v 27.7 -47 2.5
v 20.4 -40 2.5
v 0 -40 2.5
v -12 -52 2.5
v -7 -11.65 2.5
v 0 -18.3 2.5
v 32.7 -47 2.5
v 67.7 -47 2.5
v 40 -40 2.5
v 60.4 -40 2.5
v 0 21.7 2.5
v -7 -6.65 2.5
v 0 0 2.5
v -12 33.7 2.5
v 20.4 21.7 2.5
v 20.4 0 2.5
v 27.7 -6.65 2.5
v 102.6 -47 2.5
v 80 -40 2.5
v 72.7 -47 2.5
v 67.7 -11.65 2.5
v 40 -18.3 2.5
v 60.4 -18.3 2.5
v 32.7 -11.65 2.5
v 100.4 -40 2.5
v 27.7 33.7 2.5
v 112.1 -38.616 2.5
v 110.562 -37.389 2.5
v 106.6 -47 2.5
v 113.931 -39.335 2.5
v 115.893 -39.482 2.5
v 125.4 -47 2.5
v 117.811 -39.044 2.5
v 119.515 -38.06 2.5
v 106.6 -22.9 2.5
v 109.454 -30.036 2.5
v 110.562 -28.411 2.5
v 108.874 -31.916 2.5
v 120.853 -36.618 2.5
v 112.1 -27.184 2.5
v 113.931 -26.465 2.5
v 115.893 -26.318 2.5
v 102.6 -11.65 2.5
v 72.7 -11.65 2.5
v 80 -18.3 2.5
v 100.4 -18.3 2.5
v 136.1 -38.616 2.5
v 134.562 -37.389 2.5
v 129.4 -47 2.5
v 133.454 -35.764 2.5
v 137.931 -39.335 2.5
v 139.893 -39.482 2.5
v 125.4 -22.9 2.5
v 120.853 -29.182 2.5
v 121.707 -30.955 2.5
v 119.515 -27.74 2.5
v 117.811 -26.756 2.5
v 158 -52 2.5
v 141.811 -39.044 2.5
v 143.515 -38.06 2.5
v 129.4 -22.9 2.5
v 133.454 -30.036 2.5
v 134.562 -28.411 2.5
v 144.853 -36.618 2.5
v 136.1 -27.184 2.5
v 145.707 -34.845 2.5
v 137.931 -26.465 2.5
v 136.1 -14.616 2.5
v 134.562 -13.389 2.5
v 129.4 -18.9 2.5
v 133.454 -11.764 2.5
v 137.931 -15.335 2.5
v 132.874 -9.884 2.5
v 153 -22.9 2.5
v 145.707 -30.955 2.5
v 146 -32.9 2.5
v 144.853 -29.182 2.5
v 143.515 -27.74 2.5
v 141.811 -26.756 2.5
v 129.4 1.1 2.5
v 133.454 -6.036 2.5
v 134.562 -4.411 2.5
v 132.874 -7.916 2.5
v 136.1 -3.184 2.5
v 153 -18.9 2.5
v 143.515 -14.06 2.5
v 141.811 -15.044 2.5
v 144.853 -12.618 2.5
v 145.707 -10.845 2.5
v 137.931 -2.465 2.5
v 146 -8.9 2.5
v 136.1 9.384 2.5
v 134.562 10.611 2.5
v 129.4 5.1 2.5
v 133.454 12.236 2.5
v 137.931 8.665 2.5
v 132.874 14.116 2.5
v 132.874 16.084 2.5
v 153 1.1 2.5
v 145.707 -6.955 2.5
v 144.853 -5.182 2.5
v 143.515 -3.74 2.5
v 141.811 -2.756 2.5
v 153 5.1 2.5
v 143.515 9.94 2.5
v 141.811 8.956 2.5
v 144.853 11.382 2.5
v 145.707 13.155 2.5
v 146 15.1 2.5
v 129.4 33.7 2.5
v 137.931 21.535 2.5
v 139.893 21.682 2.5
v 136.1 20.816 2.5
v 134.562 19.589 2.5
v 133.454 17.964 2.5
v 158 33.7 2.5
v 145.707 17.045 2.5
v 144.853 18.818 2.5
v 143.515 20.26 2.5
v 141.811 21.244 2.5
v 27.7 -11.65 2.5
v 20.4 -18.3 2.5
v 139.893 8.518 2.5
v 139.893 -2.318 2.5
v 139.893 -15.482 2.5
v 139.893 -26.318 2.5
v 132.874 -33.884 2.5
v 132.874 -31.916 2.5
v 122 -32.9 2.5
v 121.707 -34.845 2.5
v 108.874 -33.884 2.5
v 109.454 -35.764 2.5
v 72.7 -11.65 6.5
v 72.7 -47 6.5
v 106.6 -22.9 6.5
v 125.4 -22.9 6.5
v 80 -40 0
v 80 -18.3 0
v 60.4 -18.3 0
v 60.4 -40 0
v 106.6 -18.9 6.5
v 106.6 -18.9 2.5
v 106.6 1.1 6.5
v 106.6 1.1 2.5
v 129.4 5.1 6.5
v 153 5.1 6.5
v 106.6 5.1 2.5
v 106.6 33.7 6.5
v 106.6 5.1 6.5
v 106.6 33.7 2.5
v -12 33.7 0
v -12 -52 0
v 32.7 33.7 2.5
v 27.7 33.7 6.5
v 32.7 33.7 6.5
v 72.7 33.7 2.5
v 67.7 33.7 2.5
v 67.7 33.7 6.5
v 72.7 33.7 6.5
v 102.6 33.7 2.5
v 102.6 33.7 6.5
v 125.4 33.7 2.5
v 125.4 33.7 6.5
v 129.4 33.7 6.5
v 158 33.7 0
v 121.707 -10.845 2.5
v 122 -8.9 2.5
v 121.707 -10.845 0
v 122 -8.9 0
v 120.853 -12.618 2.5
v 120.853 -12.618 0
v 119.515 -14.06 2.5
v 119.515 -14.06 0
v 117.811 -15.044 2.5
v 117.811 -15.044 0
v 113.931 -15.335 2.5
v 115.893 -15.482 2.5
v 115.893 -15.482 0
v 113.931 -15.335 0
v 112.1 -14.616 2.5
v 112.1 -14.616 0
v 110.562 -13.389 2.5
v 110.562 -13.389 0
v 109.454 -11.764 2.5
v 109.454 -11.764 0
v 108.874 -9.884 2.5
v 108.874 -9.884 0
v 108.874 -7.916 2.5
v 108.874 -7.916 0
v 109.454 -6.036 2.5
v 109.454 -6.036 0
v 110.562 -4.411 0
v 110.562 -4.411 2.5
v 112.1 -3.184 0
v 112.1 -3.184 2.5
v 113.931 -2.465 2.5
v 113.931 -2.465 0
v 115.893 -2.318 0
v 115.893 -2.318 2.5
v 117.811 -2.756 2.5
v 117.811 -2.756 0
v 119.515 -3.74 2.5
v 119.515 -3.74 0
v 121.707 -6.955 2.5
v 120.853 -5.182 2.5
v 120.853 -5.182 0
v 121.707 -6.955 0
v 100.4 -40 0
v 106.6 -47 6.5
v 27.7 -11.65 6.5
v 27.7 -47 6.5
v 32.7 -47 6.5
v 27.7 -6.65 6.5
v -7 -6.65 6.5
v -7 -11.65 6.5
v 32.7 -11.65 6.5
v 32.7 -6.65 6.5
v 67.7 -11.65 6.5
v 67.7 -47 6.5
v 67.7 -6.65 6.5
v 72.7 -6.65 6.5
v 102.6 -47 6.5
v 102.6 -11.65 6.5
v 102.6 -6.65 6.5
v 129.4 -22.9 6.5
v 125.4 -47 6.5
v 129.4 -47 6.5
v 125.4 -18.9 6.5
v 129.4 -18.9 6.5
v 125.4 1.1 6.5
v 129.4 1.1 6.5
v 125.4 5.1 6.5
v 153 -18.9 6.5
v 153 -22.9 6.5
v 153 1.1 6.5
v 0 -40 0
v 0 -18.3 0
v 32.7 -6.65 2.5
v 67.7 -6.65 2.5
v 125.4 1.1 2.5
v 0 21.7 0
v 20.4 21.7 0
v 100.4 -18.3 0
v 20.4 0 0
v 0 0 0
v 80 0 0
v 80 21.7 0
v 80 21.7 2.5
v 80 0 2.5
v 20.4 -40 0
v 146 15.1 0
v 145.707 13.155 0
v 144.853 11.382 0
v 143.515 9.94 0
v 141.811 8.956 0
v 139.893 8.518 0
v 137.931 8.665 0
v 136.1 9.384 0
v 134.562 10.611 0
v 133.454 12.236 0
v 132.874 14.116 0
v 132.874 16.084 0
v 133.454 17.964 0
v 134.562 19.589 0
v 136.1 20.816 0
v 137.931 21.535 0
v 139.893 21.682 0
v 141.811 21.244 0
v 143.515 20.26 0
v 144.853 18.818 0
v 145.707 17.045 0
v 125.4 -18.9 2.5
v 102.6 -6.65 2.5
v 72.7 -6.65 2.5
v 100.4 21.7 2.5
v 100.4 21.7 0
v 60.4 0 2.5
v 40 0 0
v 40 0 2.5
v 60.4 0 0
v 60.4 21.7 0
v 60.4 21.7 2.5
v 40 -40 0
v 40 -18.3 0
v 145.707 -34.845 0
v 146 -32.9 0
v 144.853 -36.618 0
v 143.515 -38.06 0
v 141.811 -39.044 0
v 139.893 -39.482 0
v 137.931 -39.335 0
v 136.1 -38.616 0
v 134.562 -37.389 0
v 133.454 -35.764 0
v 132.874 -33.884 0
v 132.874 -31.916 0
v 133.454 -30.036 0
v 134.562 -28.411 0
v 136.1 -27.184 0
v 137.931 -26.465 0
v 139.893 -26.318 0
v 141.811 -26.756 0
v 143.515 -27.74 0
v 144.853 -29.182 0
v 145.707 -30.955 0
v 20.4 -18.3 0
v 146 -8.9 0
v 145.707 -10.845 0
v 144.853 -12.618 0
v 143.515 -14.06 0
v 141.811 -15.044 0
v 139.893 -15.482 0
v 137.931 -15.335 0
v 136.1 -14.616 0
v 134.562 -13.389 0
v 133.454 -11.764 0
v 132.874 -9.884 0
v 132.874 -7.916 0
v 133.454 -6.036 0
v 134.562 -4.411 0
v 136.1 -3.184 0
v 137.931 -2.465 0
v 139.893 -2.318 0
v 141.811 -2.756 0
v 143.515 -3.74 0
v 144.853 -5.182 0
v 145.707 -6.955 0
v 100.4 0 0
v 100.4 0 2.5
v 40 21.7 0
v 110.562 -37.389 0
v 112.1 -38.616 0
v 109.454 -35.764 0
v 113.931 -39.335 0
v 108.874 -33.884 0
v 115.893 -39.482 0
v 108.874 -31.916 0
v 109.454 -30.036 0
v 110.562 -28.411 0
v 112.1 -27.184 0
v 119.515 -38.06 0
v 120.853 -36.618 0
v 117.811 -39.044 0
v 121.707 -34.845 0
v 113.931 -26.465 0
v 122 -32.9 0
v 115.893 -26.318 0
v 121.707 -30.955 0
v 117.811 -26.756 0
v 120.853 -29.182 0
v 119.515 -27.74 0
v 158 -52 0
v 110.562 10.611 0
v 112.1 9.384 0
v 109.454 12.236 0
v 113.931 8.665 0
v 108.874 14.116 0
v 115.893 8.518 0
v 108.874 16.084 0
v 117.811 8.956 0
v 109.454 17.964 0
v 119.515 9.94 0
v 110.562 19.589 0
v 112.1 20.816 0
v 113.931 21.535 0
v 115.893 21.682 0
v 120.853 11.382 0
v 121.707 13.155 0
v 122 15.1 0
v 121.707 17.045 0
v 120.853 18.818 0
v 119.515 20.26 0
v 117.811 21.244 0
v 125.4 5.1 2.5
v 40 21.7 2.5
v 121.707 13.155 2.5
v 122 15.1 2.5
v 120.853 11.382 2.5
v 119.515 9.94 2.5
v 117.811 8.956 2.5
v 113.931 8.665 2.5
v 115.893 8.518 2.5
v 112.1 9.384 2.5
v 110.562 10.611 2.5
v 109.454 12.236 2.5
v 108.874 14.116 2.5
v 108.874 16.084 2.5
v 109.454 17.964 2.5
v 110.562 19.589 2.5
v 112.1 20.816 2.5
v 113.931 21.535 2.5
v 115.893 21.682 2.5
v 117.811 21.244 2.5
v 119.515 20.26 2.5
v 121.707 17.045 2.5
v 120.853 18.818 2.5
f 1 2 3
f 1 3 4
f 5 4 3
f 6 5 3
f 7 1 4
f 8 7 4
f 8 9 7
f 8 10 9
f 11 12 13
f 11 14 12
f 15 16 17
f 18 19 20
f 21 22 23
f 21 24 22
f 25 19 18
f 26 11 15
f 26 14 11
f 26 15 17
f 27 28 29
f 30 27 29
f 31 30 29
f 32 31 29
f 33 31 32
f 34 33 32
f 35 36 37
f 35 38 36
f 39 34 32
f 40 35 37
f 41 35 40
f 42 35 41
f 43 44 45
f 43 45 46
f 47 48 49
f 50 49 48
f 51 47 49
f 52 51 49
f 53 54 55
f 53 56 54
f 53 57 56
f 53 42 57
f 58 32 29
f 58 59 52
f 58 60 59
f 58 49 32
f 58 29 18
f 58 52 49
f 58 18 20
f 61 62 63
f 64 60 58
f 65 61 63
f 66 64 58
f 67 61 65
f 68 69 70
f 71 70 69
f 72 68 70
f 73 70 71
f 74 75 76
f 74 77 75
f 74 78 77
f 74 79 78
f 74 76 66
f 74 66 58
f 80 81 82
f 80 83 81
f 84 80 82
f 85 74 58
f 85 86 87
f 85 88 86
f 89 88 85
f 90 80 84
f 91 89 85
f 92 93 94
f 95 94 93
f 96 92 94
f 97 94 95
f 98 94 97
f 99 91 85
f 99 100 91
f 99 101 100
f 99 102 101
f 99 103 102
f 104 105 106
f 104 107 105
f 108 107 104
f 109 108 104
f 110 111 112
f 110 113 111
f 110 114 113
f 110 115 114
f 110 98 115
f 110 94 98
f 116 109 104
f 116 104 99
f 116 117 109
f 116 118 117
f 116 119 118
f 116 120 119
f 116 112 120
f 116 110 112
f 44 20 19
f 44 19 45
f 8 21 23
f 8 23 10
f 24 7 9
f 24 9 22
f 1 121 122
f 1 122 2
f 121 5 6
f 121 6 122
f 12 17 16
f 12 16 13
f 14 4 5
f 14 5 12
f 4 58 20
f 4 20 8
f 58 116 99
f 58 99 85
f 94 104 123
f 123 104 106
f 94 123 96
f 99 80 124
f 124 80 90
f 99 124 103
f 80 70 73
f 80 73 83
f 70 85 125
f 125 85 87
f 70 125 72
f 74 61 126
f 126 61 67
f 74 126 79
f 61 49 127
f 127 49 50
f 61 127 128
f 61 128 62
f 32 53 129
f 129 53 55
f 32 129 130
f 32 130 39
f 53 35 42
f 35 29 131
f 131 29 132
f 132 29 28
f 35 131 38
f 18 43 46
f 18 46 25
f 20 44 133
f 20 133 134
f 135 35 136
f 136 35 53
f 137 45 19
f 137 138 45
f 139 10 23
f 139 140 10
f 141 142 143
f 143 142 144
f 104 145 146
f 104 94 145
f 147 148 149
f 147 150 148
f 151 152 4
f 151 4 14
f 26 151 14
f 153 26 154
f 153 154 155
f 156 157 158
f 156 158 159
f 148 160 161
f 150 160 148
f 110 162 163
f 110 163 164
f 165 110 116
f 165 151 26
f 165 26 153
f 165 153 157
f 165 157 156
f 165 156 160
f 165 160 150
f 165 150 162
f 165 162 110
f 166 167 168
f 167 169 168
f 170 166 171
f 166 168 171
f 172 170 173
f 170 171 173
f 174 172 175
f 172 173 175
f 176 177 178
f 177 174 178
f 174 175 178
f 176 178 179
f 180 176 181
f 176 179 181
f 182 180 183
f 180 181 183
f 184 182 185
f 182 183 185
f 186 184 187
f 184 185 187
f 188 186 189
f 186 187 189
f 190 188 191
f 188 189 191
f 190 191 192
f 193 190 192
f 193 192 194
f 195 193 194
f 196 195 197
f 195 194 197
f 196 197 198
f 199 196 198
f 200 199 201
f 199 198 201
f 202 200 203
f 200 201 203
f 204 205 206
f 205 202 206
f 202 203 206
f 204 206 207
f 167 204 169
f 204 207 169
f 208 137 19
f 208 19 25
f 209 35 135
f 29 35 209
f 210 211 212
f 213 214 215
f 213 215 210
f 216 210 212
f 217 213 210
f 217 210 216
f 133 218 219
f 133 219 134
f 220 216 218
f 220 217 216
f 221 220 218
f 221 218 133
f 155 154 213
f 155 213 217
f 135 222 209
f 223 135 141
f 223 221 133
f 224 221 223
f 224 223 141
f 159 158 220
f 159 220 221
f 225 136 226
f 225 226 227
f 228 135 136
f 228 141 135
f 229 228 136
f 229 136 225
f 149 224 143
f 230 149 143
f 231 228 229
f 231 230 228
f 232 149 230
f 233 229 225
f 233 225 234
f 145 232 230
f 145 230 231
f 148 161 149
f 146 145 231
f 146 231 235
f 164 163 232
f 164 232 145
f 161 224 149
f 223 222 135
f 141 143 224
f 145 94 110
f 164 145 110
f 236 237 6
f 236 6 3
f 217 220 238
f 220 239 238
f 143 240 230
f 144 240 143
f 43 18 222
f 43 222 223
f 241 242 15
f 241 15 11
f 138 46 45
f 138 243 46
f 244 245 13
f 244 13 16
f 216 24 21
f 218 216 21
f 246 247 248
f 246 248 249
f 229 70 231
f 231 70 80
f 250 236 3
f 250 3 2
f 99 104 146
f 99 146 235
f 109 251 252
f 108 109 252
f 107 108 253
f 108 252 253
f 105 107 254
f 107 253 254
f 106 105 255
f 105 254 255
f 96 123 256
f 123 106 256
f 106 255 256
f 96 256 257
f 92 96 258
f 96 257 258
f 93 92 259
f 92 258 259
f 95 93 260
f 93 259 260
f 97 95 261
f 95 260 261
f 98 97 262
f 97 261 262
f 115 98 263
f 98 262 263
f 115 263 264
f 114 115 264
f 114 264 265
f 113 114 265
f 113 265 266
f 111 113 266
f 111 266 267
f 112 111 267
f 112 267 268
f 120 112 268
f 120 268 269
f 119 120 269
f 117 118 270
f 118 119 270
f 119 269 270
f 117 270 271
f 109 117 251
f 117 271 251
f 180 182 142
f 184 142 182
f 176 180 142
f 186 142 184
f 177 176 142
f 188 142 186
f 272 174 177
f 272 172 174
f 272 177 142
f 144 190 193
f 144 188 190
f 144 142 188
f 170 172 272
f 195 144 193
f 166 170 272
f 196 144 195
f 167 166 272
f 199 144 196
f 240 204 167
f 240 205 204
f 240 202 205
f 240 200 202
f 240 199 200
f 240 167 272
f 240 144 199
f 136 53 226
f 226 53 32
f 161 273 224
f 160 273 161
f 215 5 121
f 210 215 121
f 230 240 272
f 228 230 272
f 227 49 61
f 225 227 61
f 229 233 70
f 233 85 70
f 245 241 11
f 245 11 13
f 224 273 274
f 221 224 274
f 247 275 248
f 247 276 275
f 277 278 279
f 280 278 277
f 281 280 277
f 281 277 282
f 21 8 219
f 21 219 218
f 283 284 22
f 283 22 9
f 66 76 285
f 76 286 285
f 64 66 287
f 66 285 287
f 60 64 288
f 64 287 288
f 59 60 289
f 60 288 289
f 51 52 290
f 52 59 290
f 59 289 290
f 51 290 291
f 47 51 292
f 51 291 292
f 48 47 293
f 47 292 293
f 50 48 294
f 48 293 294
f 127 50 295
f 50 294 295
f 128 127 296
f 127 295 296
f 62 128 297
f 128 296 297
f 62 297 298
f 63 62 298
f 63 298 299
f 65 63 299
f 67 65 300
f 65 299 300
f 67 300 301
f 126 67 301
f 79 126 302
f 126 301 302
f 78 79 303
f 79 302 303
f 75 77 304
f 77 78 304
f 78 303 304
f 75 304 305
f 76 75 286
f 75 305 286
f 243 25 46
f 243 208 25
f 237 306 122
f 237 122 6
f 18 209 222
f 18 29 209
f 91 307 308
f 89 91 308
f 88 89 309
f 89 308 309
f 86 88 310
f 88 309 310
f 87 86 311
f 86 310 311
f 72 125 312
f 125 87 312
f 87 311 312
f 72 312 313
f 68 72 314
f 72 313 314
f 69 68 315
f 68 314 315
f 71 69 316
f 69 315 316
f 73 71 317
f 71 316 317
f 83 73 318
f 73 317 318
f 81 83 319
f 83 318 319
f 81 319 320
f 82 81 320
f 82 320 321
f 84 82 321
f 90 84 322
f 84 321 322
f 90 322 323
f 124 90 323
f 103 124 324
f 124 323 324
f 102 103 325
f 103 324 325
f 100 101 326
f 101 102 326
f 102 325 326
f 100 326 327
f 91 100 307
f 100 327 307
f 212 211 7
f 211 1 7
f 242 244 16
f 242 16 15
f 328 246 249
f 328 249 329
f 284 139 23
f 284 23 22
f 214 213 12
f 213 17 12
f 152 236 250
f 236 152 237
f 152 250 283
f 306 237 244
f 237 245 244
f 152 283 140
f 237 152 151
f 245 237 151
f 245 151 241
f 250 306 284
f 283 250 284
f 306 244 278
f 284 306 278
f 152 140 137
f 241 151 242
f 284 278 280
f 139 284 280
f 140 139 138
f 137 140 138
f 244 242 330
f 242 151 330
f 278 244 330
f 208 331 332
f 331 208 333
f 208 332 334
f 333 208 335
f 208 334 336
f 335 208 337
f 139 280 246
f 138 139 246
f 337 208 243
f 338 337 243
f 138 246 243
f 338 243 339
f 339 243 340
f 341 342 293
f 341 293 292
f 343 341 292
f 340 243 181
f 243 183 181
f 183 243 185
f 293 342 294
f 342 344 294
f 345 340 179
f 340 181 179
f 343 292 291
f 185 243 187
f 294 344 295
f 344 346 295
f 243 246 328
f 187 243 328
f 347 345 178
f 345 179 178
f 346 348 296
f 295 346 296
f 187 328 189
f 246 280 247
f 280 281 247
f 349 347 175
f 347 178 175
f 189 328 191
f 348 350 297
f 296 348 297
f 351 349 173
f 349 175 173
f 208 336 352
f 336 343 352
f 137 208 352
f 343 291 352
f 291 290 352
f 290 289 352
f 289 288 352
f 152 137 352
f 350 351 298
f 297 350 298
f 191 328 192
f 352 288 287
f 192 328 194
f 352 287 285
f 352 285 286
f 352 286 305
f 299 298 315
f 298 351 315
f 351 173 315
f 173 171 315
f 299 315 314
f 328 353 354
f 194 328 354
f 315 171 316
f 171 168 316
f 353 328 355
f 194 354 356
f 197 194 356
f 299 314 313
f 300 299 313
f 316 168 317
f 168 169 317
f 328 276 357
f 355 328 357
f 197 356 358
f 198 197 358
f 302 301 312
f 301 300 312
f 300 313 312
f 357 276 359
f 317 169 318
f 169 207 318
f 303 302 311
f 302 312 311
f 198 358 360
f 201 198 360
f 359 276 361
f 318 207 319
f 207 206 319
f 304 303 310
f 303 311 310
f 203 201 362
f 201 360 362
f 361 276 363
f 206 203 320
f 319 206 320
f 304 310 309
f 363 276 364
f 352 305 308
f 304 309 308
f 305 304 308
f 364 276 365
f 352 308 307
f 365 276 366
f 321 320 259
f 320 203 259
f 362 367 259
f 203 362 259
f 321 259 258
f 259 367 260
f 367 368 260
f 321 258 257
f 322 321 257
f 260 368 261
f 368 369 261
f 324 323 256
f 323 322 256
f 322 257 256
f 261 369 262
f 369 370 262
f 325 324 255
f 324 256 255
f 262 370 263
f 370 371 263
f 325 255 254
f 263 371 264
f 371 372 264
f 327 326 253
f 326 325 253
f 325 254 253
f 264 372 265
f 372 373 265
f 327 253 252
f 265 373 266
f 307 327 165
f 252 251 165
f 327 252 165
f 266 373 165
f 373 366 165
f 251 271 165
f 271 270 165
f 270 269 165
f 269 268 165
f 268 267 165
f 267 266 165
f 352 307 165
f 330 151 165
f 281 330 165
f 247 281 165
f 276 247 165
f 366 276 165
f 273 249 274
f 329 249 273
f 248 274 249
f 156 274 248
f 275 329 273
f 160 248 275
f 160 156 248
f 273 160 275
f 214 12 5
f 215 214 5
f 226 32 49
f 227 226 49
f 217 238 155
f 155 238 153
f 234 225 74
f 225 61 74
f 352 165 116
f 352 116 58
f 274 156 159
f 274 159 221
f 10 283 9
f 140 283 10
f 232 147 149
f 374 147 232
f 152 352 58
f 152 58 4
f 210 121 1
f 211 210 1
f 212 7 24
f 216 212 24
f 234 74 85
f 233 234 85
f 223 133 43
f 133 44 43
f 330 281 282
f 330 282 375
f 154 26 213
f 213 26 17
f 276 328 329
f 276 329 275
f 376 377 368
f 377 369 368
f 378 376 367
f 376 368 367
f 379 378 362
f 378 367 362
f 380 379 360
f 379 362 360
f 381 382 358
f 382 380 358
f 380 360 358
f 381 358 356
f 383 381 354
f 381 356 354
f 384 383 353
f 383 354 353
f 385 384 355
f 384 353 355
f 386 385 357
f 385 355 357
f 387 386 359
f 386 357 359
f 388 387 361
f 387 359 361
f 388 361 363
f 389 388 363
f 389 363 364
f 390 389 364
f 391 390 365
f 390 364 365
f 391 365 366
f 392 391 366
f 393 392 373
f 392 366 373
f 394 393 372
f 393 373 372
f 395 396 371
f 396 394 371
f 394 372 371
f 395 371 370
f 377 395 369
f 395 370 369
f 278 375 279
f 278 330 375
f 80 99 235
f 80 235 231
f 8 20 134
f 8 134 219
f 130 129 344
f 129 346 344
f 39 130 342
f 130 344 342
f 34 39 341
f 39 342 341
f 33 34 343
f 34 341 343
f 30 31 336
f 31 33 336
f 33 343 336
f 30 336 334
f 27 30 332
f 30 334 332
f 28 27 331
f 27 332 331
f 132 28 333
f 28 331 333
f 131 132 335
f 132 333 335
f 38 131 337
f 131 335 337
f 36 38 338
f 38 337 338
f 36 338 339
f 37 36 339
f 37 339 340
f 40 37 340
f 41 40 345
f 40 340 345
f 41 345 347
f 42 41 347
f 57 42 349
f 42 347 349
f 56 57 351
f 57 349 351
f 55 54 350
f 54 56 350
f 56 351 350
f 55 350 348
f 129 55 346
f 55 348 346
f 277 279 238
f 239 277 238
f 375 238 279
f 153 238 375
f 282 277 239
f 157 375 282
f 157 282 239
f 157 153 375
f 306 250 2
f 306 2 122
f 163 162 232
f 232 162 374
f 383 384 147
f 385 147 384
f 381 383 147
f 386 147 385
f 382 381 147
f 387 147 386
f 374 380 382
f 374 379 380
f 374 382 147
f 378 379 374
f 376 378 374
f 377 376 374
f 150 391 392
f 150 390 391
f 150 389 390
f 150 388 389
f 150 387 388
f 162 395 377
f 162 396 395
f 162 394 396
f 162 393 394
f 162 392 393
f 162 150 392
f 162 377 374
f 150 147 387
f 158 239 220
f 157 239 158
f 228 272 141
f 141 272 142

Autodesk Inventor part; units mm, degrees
ref_plane "YZ Plane" through (0, 0, 0) normal (1, 0, 0) x (0, 1, 0)
ref_plane "XZ Plane" through (0, 0, 0) normal (0, 1, 0) x (-1, 0, 0)
ref_plane "XY Plane" through (0, 0, 0) normal (0, 0, 1) x (1, 0, 0)
sketch "Sketch1" plane through (0, 0, 0) normal (0, 0, 1) x (1, 0, 0)
  point P0 (0, 0)
sketch "Sketch2" plane through (0, 0, 0) normal (0, 0, 1) x (1, 0, 0)
  line L0 (0, 0) -> (20.4, 0)
  line L1 (20.4, 0) -> (20.4, 21.7)
  line L2 (20.4, 21.7) -> (0, 21.7)
  line L3 (0, 21.7) -> (0, 0)
  line L4 (40, 0) -> (60.4, 0)
  line L5 (60.4, 0) -> (60.4, 21.7)
  line L6 (60.4, 21.7) -> (40, 21.7)
  line L7 (40, 21.7) -> (40, 0)
  line L8 (80, 0) -> (100.4, 0)
  line L9 (100.4, 0) -> (100.4, 21.7)
  line L10 (100.4, 21.7) -> (80, 21.7)
  line L11 (80, 21.7) -> (80, 0)
  line L12 (0, -40) -> (20.4, -40)
  line L13 (20.4, -40) -> (20.4, -18.3)
  line L14 (20.4, -18.3) -> (0, -18.3)
  line L15 (0, -18.3) -> (0, -40)
  line L16 (40, -40) -> (60.4, -40)
  line L17 (60.4, -40) -> (60.4, -18.3)
  line L18 (60.4, -18.3) -> (40, -18.3)
  line L19 (40, -18.3) -> (40, -40)
  line L20 (80, -40) -> (100.4, -40)
  line L21 (100.4, -40) -> (100.4, -18.3)
  line L22 (100.4, -18.3) -> (80, -18.3)
  line L23 (80, -18.3) -> (80, -40)
  line L24 (100.4, 21.7) -> (175.4, 21.7) construction
  line L25 (175.4, 21.7) -> (175.4, -53.3) construction
  line L26 (175.4, -53.3) -> (100.4, -53.3) construction
  line L27 (100.4, -53.3) -> (100.4, 21.7) construction
  circle A0 centre (115.4, 15.1) radius 6.6 construction
  line L28 (115.4, 15.1) -> (115.4, -53.3) construction
  circle A1 centre (115.4, -8.9) radius 6.6 construction
  circle A2 centre (115.4, -32.9) radius 6.6 construction
  line L29 (100.4, 15.1) -> (200.3961, 15.1) construction
  circle A3 centre (139.4, 15.1) radius 6.6 construction
  circle A4 centre (139.4, -8.9) radius 6.6 construction
  circle A5 centre (139.4, -32.9) radius 6.6 construction
  circle A6 centre (115.4, 15.1) radius 6.6
  circle A7 centre (139.4, 15.1) radius 6.6 construction
  circle A8 centre (139.4, 15.1) radius 6.6
  circle A9 centre (115.4, -8.9) radius 6.6 construction
  circle A10 centre (115.4, -8.9) radius 6.6
  circle A11 centre (139.4, -8.9) radius 6.6 construction
  circle A12 centre (139.4, -8.9) radius 6.6
  circle A13 centre (115.4, -32.9) radius 6.6 construction
  circle A14 centre (115.4, -32.9) radius 6.6
  circle A15 centre (139.4, -32.9) radius 6.6 construction
  circle A16 centre (139.4, -32.9) radius 6.6
  line L30 (0, 21.7) -> (-12, 21.7) construction
  line L31 (-12, 21.7) -> (-12, 33.7) construction
  line L32 (-12, 33.7) -> (0, 33.7) construction
  line L33 (0, 33.7) -> (0, 21.7) construction
  line L34 (146, -40) -> (158, -40) construction
  line L35 (158, -40) -> (158, -52) construction
  line L36 (158, -52) -> (146, -52) construction
  line L37 (146, -52) -> (146, -40) construction
  line L38 (139.4, -32.9) -> (139.4, -74.4589) construction
  line L39 (-12, 33.7) -> (158, 33.7)
  line L40 (158, 33.7) -> (158, -52)
  line L41 (158, -52) -> (-12, -52)
  line L42 (-12, -52) -> (-12, 33.7)
  point P0 (146, -46)
  dimension "d0" = 20.4
  dimension "d1" = 21.7
  dimension "d5" = 40
  dimension "d8" = 40
  dimension "d11" = 75
  dimension "d12" = 75
  dimension "d13" = 13.2
  dimension "d14" = 15
  dimension "d15" = 13.2
  dimension "d16" = 24
  dimension "d17" = 13.2
  dimension "d18" = 24
  dimension "d19" = 61.7
  dimension "d20" = 13.2
  dimension "d21" = 24
  dimension "d22" = 13.2
  dimension "d23" = 13.2
  dimension "d26" = 24
  dimension "d29" = 24
  dimension "d32" = 12
  dimension "d33" = 12
  dimension "d34" = 12
  dimension "d35" = 12
  dimension "d36" = 6.6
extrude "Extrusion1" add sketch "Sketch2" along normal blind 2.5
sketch "Sketch3" plane through (0, 0, 2.5) normal (0, 0, 1) x (1, 0, 0)
  line L0 (-12, -52) -> (158, -52) construction
  line L1 (158, -52) -> (158, 33.7) construction
  line L2 (158, 33.7) -> (-12, 33.7) construction
  line L3 (-12, 33.7) -> (-12, -52) construction
  circle A0 centre (115.4, 15.1) radius 6.6 construction
  circle A1 centre (139.4, 15.1) radius 6.6 construction
  circle A2 centre (115.4, -8.9) radius 6.6 construction
  circle A3 centre (139.4, -8.9) radius 6.6 construction
  circle A4 centre (115.4, -32.9) radius 6.6 construction
  circle A5 centre (139.4, -32.9) radius 6.6 construction
  line L4 (80, -40) -> (80, -18.3) construction
  line L5 (80, -18.3) -> (100.4, -18.3) construction
  line L6 (100.4, -18.3) -> (100.4, -40) construction
  line L7 (100.4, -40) -> (80, -40) construction
  line L8 (40, -40) -> (40, -18.3) construction
  line L9 (40, -18.3) -> (60.4, -18.3) construction
  line L10 (60.4, -18.3) -> (60.4, -40) construction
  line L11 (60.4, -40) -> (40, -40) construction
  line L12 (0, -40) -> (0, -18.3) construction
  line L13 (0, -18.3) -> (20.4, -18.3) construction
  line L14 (20.4, -18.3) -> (20.4, -40) construction
  line L15 (20.4, -40) -> (0, -40) construction
  line L16 (80, 0) -> (80, 21.7) construction
  line L17 (80, 21.7) -> (100.4, 21.7) construction
  line L18 (100.4, 21.7) -> (100.4, 0) construction
  line L19 (100.4, 0) -> (80, 0) construction
  line L20 (40, 0) -> (40, 21.7) construction
  line L21 (40, 21.7) -> (60.4, 21.7) construction
  line L22 (60.4, 21.7) -> (60.4, 0) construction
  line L23 (60.4, 0) -> (40, 0) construction
  line L24 (0, 0) -> (0, 21.7) construction
  line L25 (0, 21.7) -> (20.4, 21.7) construction
  line L26 (20.4, 21.7) -> (20.4, 0) construction
  line L27 (20.4, 0) -> (0, 0) construction
  line L28 (-7, 28.7) -> (153, 28.7) construction
  line L29 (153, 28.7) -> (153, -47) construction
  line L30 (153, -47) -> (-7, -47) construction
  line L31 (-7, -47) -> (-7, 28.7) construction
  line L32 (-7, -9.15) -> (-7, -6.65) construction
  line L33 (-7, -6.65) -> (-7, -11.65) construction
  line L34 (20.4, 21.7) -> (40, 21.7) construction
  line L35 (30.2, 21.7) -> (30.2, 28.7) construction
  line L36 (60.4, 21.7) -> (80, 21.7) construction
  line L37 (70.2, 21.7) -> (70.2, 28.7) construction
  line L38 (30.2, 28.7) -> (32.7, 28.7) construction
  line L39 (70.2, 28.7) -> (72.7, 28.7) construction
  line L40 (32.7, 28.7) -> (27.7, 28.7) construction
  line L41 (27.7, 28.7) -> (27.7, -47) construction
  line L42 (27.7, -47) -> (32.7, -47) construction
  line L43 (32.7, -47) -> (32.7, 28.7) construction
  line L44 (72.7, 28.7) -> (67.7, 28.7) construction
  line L45 (67.7, 28.7) -> (67.7, -47) construction
  line L46 (67.7, -47) -> (72.7, -47) construction
  line L47 (72.7, -47) -> (72.7, 28.7) construction
  circle A6 centre (115.4, 15.1) radius 6.6 construction
  line L48 (108.8, 15.1) -> (100.4, 15.1) construction
  line L49 (104.6, 15.1) -> (104.6, 28.7) construction
  line L50 (104.6, 28.7) -> (106.6, 28.7) construction
  line L51 (106.6, 28.7) -> (102.6, 28.7) construction
  line L52 (102.6, 28.7) -> (102.6, -47) construction
  line L53 (102.6, -47) -> (106.6, -47) construction
  line L54 (106.6, -47) -> (106.6, 28.7) construction
  line L55 (-7, -6.65) -> (-7, -11.65) construction
  line L56 (-7, -11.65) -> (106.6, -11.65) construction
  line L57 (106.6, -11.65) -> (106.6, -6.65) construction
  line L58 (106.6, -6.65) -> (-7, -6.65) construction
  line L59 (115.4, -2.3) -> (115.4, 8.5) construction
  line L60 (122, 15.1) -> (132.8, 15.1) construction
  line L61 (115.4, -26.3) -> (115.4, -15.5) construction
  line L62 (106.6, 3.1) -> (106.6, 1.1) construction
  line L63 (106.6, 1.1) -> (106.6, 5.1) construction
  line L64 (106.6, 5.1) -> (153, 5.1) construction
  line L65 (153, 5.1) -> (153, 1.1) construction
  line L66 (153, 1.1) -> (106.6, 1.1) construction
  line L67 (106.6, -20.9) -> (106.6, -22.9) construction
  line L68 (106.6, -22.9) -> (106.6, -18.9) construction
  line L69 (106.6, -18.9) -> (153, -18.9) construction
  line L70 (153, -18.9) -> (153, -22.9) construction
  line L71 (153, -22.9) -> (106.6, -22.9) construction
  line L72 (127.4, 28.7) -> (129.4, 28.7) construction
  line L73 (129.4, 28.7) -> (125.4, 28.7) construction
  line L74 (125.4, 28.7) -> (125.4, -47) construction
  line L75 (125.4, -47) -> (129.4, -47) construction
  line L76 (129.4, -47) -> (129.4, 28.7) construction
  line L77 (-7, -11.65) -> (106.6, -11.65)
  line L78 (106.6, -11.65) -> (106.6, -6.65)
  line L79 (106.6, -6.65) -> (-7, -6.65)
  line L80 (-7, -6.65) -> (-7, -11.65)
  line L81 (102.6, 28.7) -> (106.6, 28.7)
  line L82 (106.6, 28.7) -> (106.6, -47)
  line L83 (106.6, -47) -> (102.6, -47)
  line L84 (102.6, -47) -> (102.6, 28.7)
  line L85 (125.4, -47) -> (129.4, -47)
  line L86 (129.4, -47) -> (129.4, 28.7)
  line L87 (129.4, 28.7) -> (125.4, 28.7)
  line L88 (125.4, 28.7) -> (125.4, -47)
  line L89 (102.6, 5.1) -> (153, 5.1)
  line L90 (153, 5.1) -> (153, 1.1)
  line L91 (153, 1.1) -> (102.6, 1.1)
  line L92 (102.6, 1.1) -> (102.6, 5.1)
  line L93 (153, -18.9) -> (102.6, -18.9)
  line L94 (102.6, -18.9) -> (102.6, -22.9)
  line L95 (102.6, -22.9) -> (153, -22.9)
  line L96 (153, -22.9) -> (153, -18.9)
  line L97 (67.7, 28.7) -> (72.7, 28.7)
  line L98 (72.7, 28.7) -> (72.7, -47)
  line L99 (72.7, -47) -> (67.7, -47)
  line L100 (67.7, -47) -> (67.7, 28.7)
  line L101 (32.7, 28.7) -> (27.7, 28.7)
  line L102 (27.7, 28.7) -> (27.7, -47)
  line L103 (27.7, -47) -> (32.7, -47)
  line L104 (32.7, -47) -> (32.7, 28.7)
  line L105 (27.7, 28.7) -> (32.7, 28.7)
  line L106 (32.7, 28.7) -> (32.7, 33.7)
  line L107 (32.7, 33.7) -> (27.7, 33.7)
  line L108 (27.7, 33.7) -> (27.7, 28.7)
  line L109 (158, 33.7) -> (-12, 33.7) projected
  line L110 (67.7, 28.7) -> (72.7, 28.7)
  line L111 (72.7, 28.7) -> (72.7, 33.7)
  line L112 (72.7, 33.7) -> (67.7, 33.7)
  line L113 (67.7, 33.7) -> (67.7, 28.7)
  line L114 (102.6, 28.7) -> (106.6, 28.7)
  line L115 (106.6, 28.7) -> (106.6, 33.7)
  line L116 (106.6, 33.7) -> (102.6, 33.7)
  line L117 (102.6, 33.7) -> (102.6, 28.7)
  line L118 (125.4, 28.7) -> (129.4, 28.7)
  line L119 (129.4, 28.7) -> (129.4, 33.7)
  line L120 (129.4, 33.7) -> (125.4, 33.7)
  line L121 (125.4, 33.7) -> (125.4, 28.7)
  point P0 (102.6, -6.65)
  point P1 (72.7, -6.65)
  point P2 (67.7, -6.65)
  point P3 (32.7, -6.65)
  point P4 (27.7, -6.65)
  point P5 (27.7, -11.65)
  point P6 (32.7, -11.65)
  point P7 (67.7, -11.65)
  point P8 (72.7, -11.65)
  point P9 (102.6, -11.65)
  point P10 (125.4, -22.9)
  point P11 (129.4, -22.9)
  point P12 (129.4, -18.9)
  point P13 (129.4, 1.1)
  point P14 (129.4, 5.1)
  point P15 (125.4, 5.1)
  point P16 (106.6, 5.1)
  point P17 (125.4, 1.1)
  point P18 (125.4, -18.9)
  dimension "d39" = 5
  dimension "d40" = 2.5
  dimension "d42" = 2.5
  dimension "d43" = 2.5
  dimension "d44" = 5
  dimension "d45" = 5
  dimension "d46" = 2
  dimension "d47" = 4
  dimension "d48" = 5
  dimension "d49" = 2
  dimension "d50" = 4
  dimension "d51" = 2
  dimension "d52" = 4
  dimension "d53" = 2
  dimension "d54" = 4
extrude "Extrusion2" add sketch "Sketch3" along normal blind 4 contours L80 L79 L102 L77 | L102 L79 L104 L77 | L77 L104 L103 L102 | L104 L79 L100 L77 | L102 L101 L104 L79 | L100 L79 L98 L77 | L77 L98 L99 L100 | L108 L107 L106 L101 | L98 L79 L84 L77 | L100 L97 L98 L79 | L84 L79 L78 L77 | L77 L82 L93 L84 | L113 L109 L111 L97 | L93 L82 L95 L84 | L84 L91 L82 L79 | L93 L88 L95 L82 | L95 L82 L83 L84 | L84 L89 L82 L91 | L82 L89 L88 L91 | L93 L86 L95 L88 | L88 L91 L86 L93 | L84 L81 L82 L89 | L109 L115 L81 L117 | L88 L89 L86 L91 | L95 L86 L85 L88 | L93 L96 L95 L86 | L88 L87 L86 L89 | L86 L89 L90 L91 | L109 L119 L87 L121
properties part number "faceplate"
